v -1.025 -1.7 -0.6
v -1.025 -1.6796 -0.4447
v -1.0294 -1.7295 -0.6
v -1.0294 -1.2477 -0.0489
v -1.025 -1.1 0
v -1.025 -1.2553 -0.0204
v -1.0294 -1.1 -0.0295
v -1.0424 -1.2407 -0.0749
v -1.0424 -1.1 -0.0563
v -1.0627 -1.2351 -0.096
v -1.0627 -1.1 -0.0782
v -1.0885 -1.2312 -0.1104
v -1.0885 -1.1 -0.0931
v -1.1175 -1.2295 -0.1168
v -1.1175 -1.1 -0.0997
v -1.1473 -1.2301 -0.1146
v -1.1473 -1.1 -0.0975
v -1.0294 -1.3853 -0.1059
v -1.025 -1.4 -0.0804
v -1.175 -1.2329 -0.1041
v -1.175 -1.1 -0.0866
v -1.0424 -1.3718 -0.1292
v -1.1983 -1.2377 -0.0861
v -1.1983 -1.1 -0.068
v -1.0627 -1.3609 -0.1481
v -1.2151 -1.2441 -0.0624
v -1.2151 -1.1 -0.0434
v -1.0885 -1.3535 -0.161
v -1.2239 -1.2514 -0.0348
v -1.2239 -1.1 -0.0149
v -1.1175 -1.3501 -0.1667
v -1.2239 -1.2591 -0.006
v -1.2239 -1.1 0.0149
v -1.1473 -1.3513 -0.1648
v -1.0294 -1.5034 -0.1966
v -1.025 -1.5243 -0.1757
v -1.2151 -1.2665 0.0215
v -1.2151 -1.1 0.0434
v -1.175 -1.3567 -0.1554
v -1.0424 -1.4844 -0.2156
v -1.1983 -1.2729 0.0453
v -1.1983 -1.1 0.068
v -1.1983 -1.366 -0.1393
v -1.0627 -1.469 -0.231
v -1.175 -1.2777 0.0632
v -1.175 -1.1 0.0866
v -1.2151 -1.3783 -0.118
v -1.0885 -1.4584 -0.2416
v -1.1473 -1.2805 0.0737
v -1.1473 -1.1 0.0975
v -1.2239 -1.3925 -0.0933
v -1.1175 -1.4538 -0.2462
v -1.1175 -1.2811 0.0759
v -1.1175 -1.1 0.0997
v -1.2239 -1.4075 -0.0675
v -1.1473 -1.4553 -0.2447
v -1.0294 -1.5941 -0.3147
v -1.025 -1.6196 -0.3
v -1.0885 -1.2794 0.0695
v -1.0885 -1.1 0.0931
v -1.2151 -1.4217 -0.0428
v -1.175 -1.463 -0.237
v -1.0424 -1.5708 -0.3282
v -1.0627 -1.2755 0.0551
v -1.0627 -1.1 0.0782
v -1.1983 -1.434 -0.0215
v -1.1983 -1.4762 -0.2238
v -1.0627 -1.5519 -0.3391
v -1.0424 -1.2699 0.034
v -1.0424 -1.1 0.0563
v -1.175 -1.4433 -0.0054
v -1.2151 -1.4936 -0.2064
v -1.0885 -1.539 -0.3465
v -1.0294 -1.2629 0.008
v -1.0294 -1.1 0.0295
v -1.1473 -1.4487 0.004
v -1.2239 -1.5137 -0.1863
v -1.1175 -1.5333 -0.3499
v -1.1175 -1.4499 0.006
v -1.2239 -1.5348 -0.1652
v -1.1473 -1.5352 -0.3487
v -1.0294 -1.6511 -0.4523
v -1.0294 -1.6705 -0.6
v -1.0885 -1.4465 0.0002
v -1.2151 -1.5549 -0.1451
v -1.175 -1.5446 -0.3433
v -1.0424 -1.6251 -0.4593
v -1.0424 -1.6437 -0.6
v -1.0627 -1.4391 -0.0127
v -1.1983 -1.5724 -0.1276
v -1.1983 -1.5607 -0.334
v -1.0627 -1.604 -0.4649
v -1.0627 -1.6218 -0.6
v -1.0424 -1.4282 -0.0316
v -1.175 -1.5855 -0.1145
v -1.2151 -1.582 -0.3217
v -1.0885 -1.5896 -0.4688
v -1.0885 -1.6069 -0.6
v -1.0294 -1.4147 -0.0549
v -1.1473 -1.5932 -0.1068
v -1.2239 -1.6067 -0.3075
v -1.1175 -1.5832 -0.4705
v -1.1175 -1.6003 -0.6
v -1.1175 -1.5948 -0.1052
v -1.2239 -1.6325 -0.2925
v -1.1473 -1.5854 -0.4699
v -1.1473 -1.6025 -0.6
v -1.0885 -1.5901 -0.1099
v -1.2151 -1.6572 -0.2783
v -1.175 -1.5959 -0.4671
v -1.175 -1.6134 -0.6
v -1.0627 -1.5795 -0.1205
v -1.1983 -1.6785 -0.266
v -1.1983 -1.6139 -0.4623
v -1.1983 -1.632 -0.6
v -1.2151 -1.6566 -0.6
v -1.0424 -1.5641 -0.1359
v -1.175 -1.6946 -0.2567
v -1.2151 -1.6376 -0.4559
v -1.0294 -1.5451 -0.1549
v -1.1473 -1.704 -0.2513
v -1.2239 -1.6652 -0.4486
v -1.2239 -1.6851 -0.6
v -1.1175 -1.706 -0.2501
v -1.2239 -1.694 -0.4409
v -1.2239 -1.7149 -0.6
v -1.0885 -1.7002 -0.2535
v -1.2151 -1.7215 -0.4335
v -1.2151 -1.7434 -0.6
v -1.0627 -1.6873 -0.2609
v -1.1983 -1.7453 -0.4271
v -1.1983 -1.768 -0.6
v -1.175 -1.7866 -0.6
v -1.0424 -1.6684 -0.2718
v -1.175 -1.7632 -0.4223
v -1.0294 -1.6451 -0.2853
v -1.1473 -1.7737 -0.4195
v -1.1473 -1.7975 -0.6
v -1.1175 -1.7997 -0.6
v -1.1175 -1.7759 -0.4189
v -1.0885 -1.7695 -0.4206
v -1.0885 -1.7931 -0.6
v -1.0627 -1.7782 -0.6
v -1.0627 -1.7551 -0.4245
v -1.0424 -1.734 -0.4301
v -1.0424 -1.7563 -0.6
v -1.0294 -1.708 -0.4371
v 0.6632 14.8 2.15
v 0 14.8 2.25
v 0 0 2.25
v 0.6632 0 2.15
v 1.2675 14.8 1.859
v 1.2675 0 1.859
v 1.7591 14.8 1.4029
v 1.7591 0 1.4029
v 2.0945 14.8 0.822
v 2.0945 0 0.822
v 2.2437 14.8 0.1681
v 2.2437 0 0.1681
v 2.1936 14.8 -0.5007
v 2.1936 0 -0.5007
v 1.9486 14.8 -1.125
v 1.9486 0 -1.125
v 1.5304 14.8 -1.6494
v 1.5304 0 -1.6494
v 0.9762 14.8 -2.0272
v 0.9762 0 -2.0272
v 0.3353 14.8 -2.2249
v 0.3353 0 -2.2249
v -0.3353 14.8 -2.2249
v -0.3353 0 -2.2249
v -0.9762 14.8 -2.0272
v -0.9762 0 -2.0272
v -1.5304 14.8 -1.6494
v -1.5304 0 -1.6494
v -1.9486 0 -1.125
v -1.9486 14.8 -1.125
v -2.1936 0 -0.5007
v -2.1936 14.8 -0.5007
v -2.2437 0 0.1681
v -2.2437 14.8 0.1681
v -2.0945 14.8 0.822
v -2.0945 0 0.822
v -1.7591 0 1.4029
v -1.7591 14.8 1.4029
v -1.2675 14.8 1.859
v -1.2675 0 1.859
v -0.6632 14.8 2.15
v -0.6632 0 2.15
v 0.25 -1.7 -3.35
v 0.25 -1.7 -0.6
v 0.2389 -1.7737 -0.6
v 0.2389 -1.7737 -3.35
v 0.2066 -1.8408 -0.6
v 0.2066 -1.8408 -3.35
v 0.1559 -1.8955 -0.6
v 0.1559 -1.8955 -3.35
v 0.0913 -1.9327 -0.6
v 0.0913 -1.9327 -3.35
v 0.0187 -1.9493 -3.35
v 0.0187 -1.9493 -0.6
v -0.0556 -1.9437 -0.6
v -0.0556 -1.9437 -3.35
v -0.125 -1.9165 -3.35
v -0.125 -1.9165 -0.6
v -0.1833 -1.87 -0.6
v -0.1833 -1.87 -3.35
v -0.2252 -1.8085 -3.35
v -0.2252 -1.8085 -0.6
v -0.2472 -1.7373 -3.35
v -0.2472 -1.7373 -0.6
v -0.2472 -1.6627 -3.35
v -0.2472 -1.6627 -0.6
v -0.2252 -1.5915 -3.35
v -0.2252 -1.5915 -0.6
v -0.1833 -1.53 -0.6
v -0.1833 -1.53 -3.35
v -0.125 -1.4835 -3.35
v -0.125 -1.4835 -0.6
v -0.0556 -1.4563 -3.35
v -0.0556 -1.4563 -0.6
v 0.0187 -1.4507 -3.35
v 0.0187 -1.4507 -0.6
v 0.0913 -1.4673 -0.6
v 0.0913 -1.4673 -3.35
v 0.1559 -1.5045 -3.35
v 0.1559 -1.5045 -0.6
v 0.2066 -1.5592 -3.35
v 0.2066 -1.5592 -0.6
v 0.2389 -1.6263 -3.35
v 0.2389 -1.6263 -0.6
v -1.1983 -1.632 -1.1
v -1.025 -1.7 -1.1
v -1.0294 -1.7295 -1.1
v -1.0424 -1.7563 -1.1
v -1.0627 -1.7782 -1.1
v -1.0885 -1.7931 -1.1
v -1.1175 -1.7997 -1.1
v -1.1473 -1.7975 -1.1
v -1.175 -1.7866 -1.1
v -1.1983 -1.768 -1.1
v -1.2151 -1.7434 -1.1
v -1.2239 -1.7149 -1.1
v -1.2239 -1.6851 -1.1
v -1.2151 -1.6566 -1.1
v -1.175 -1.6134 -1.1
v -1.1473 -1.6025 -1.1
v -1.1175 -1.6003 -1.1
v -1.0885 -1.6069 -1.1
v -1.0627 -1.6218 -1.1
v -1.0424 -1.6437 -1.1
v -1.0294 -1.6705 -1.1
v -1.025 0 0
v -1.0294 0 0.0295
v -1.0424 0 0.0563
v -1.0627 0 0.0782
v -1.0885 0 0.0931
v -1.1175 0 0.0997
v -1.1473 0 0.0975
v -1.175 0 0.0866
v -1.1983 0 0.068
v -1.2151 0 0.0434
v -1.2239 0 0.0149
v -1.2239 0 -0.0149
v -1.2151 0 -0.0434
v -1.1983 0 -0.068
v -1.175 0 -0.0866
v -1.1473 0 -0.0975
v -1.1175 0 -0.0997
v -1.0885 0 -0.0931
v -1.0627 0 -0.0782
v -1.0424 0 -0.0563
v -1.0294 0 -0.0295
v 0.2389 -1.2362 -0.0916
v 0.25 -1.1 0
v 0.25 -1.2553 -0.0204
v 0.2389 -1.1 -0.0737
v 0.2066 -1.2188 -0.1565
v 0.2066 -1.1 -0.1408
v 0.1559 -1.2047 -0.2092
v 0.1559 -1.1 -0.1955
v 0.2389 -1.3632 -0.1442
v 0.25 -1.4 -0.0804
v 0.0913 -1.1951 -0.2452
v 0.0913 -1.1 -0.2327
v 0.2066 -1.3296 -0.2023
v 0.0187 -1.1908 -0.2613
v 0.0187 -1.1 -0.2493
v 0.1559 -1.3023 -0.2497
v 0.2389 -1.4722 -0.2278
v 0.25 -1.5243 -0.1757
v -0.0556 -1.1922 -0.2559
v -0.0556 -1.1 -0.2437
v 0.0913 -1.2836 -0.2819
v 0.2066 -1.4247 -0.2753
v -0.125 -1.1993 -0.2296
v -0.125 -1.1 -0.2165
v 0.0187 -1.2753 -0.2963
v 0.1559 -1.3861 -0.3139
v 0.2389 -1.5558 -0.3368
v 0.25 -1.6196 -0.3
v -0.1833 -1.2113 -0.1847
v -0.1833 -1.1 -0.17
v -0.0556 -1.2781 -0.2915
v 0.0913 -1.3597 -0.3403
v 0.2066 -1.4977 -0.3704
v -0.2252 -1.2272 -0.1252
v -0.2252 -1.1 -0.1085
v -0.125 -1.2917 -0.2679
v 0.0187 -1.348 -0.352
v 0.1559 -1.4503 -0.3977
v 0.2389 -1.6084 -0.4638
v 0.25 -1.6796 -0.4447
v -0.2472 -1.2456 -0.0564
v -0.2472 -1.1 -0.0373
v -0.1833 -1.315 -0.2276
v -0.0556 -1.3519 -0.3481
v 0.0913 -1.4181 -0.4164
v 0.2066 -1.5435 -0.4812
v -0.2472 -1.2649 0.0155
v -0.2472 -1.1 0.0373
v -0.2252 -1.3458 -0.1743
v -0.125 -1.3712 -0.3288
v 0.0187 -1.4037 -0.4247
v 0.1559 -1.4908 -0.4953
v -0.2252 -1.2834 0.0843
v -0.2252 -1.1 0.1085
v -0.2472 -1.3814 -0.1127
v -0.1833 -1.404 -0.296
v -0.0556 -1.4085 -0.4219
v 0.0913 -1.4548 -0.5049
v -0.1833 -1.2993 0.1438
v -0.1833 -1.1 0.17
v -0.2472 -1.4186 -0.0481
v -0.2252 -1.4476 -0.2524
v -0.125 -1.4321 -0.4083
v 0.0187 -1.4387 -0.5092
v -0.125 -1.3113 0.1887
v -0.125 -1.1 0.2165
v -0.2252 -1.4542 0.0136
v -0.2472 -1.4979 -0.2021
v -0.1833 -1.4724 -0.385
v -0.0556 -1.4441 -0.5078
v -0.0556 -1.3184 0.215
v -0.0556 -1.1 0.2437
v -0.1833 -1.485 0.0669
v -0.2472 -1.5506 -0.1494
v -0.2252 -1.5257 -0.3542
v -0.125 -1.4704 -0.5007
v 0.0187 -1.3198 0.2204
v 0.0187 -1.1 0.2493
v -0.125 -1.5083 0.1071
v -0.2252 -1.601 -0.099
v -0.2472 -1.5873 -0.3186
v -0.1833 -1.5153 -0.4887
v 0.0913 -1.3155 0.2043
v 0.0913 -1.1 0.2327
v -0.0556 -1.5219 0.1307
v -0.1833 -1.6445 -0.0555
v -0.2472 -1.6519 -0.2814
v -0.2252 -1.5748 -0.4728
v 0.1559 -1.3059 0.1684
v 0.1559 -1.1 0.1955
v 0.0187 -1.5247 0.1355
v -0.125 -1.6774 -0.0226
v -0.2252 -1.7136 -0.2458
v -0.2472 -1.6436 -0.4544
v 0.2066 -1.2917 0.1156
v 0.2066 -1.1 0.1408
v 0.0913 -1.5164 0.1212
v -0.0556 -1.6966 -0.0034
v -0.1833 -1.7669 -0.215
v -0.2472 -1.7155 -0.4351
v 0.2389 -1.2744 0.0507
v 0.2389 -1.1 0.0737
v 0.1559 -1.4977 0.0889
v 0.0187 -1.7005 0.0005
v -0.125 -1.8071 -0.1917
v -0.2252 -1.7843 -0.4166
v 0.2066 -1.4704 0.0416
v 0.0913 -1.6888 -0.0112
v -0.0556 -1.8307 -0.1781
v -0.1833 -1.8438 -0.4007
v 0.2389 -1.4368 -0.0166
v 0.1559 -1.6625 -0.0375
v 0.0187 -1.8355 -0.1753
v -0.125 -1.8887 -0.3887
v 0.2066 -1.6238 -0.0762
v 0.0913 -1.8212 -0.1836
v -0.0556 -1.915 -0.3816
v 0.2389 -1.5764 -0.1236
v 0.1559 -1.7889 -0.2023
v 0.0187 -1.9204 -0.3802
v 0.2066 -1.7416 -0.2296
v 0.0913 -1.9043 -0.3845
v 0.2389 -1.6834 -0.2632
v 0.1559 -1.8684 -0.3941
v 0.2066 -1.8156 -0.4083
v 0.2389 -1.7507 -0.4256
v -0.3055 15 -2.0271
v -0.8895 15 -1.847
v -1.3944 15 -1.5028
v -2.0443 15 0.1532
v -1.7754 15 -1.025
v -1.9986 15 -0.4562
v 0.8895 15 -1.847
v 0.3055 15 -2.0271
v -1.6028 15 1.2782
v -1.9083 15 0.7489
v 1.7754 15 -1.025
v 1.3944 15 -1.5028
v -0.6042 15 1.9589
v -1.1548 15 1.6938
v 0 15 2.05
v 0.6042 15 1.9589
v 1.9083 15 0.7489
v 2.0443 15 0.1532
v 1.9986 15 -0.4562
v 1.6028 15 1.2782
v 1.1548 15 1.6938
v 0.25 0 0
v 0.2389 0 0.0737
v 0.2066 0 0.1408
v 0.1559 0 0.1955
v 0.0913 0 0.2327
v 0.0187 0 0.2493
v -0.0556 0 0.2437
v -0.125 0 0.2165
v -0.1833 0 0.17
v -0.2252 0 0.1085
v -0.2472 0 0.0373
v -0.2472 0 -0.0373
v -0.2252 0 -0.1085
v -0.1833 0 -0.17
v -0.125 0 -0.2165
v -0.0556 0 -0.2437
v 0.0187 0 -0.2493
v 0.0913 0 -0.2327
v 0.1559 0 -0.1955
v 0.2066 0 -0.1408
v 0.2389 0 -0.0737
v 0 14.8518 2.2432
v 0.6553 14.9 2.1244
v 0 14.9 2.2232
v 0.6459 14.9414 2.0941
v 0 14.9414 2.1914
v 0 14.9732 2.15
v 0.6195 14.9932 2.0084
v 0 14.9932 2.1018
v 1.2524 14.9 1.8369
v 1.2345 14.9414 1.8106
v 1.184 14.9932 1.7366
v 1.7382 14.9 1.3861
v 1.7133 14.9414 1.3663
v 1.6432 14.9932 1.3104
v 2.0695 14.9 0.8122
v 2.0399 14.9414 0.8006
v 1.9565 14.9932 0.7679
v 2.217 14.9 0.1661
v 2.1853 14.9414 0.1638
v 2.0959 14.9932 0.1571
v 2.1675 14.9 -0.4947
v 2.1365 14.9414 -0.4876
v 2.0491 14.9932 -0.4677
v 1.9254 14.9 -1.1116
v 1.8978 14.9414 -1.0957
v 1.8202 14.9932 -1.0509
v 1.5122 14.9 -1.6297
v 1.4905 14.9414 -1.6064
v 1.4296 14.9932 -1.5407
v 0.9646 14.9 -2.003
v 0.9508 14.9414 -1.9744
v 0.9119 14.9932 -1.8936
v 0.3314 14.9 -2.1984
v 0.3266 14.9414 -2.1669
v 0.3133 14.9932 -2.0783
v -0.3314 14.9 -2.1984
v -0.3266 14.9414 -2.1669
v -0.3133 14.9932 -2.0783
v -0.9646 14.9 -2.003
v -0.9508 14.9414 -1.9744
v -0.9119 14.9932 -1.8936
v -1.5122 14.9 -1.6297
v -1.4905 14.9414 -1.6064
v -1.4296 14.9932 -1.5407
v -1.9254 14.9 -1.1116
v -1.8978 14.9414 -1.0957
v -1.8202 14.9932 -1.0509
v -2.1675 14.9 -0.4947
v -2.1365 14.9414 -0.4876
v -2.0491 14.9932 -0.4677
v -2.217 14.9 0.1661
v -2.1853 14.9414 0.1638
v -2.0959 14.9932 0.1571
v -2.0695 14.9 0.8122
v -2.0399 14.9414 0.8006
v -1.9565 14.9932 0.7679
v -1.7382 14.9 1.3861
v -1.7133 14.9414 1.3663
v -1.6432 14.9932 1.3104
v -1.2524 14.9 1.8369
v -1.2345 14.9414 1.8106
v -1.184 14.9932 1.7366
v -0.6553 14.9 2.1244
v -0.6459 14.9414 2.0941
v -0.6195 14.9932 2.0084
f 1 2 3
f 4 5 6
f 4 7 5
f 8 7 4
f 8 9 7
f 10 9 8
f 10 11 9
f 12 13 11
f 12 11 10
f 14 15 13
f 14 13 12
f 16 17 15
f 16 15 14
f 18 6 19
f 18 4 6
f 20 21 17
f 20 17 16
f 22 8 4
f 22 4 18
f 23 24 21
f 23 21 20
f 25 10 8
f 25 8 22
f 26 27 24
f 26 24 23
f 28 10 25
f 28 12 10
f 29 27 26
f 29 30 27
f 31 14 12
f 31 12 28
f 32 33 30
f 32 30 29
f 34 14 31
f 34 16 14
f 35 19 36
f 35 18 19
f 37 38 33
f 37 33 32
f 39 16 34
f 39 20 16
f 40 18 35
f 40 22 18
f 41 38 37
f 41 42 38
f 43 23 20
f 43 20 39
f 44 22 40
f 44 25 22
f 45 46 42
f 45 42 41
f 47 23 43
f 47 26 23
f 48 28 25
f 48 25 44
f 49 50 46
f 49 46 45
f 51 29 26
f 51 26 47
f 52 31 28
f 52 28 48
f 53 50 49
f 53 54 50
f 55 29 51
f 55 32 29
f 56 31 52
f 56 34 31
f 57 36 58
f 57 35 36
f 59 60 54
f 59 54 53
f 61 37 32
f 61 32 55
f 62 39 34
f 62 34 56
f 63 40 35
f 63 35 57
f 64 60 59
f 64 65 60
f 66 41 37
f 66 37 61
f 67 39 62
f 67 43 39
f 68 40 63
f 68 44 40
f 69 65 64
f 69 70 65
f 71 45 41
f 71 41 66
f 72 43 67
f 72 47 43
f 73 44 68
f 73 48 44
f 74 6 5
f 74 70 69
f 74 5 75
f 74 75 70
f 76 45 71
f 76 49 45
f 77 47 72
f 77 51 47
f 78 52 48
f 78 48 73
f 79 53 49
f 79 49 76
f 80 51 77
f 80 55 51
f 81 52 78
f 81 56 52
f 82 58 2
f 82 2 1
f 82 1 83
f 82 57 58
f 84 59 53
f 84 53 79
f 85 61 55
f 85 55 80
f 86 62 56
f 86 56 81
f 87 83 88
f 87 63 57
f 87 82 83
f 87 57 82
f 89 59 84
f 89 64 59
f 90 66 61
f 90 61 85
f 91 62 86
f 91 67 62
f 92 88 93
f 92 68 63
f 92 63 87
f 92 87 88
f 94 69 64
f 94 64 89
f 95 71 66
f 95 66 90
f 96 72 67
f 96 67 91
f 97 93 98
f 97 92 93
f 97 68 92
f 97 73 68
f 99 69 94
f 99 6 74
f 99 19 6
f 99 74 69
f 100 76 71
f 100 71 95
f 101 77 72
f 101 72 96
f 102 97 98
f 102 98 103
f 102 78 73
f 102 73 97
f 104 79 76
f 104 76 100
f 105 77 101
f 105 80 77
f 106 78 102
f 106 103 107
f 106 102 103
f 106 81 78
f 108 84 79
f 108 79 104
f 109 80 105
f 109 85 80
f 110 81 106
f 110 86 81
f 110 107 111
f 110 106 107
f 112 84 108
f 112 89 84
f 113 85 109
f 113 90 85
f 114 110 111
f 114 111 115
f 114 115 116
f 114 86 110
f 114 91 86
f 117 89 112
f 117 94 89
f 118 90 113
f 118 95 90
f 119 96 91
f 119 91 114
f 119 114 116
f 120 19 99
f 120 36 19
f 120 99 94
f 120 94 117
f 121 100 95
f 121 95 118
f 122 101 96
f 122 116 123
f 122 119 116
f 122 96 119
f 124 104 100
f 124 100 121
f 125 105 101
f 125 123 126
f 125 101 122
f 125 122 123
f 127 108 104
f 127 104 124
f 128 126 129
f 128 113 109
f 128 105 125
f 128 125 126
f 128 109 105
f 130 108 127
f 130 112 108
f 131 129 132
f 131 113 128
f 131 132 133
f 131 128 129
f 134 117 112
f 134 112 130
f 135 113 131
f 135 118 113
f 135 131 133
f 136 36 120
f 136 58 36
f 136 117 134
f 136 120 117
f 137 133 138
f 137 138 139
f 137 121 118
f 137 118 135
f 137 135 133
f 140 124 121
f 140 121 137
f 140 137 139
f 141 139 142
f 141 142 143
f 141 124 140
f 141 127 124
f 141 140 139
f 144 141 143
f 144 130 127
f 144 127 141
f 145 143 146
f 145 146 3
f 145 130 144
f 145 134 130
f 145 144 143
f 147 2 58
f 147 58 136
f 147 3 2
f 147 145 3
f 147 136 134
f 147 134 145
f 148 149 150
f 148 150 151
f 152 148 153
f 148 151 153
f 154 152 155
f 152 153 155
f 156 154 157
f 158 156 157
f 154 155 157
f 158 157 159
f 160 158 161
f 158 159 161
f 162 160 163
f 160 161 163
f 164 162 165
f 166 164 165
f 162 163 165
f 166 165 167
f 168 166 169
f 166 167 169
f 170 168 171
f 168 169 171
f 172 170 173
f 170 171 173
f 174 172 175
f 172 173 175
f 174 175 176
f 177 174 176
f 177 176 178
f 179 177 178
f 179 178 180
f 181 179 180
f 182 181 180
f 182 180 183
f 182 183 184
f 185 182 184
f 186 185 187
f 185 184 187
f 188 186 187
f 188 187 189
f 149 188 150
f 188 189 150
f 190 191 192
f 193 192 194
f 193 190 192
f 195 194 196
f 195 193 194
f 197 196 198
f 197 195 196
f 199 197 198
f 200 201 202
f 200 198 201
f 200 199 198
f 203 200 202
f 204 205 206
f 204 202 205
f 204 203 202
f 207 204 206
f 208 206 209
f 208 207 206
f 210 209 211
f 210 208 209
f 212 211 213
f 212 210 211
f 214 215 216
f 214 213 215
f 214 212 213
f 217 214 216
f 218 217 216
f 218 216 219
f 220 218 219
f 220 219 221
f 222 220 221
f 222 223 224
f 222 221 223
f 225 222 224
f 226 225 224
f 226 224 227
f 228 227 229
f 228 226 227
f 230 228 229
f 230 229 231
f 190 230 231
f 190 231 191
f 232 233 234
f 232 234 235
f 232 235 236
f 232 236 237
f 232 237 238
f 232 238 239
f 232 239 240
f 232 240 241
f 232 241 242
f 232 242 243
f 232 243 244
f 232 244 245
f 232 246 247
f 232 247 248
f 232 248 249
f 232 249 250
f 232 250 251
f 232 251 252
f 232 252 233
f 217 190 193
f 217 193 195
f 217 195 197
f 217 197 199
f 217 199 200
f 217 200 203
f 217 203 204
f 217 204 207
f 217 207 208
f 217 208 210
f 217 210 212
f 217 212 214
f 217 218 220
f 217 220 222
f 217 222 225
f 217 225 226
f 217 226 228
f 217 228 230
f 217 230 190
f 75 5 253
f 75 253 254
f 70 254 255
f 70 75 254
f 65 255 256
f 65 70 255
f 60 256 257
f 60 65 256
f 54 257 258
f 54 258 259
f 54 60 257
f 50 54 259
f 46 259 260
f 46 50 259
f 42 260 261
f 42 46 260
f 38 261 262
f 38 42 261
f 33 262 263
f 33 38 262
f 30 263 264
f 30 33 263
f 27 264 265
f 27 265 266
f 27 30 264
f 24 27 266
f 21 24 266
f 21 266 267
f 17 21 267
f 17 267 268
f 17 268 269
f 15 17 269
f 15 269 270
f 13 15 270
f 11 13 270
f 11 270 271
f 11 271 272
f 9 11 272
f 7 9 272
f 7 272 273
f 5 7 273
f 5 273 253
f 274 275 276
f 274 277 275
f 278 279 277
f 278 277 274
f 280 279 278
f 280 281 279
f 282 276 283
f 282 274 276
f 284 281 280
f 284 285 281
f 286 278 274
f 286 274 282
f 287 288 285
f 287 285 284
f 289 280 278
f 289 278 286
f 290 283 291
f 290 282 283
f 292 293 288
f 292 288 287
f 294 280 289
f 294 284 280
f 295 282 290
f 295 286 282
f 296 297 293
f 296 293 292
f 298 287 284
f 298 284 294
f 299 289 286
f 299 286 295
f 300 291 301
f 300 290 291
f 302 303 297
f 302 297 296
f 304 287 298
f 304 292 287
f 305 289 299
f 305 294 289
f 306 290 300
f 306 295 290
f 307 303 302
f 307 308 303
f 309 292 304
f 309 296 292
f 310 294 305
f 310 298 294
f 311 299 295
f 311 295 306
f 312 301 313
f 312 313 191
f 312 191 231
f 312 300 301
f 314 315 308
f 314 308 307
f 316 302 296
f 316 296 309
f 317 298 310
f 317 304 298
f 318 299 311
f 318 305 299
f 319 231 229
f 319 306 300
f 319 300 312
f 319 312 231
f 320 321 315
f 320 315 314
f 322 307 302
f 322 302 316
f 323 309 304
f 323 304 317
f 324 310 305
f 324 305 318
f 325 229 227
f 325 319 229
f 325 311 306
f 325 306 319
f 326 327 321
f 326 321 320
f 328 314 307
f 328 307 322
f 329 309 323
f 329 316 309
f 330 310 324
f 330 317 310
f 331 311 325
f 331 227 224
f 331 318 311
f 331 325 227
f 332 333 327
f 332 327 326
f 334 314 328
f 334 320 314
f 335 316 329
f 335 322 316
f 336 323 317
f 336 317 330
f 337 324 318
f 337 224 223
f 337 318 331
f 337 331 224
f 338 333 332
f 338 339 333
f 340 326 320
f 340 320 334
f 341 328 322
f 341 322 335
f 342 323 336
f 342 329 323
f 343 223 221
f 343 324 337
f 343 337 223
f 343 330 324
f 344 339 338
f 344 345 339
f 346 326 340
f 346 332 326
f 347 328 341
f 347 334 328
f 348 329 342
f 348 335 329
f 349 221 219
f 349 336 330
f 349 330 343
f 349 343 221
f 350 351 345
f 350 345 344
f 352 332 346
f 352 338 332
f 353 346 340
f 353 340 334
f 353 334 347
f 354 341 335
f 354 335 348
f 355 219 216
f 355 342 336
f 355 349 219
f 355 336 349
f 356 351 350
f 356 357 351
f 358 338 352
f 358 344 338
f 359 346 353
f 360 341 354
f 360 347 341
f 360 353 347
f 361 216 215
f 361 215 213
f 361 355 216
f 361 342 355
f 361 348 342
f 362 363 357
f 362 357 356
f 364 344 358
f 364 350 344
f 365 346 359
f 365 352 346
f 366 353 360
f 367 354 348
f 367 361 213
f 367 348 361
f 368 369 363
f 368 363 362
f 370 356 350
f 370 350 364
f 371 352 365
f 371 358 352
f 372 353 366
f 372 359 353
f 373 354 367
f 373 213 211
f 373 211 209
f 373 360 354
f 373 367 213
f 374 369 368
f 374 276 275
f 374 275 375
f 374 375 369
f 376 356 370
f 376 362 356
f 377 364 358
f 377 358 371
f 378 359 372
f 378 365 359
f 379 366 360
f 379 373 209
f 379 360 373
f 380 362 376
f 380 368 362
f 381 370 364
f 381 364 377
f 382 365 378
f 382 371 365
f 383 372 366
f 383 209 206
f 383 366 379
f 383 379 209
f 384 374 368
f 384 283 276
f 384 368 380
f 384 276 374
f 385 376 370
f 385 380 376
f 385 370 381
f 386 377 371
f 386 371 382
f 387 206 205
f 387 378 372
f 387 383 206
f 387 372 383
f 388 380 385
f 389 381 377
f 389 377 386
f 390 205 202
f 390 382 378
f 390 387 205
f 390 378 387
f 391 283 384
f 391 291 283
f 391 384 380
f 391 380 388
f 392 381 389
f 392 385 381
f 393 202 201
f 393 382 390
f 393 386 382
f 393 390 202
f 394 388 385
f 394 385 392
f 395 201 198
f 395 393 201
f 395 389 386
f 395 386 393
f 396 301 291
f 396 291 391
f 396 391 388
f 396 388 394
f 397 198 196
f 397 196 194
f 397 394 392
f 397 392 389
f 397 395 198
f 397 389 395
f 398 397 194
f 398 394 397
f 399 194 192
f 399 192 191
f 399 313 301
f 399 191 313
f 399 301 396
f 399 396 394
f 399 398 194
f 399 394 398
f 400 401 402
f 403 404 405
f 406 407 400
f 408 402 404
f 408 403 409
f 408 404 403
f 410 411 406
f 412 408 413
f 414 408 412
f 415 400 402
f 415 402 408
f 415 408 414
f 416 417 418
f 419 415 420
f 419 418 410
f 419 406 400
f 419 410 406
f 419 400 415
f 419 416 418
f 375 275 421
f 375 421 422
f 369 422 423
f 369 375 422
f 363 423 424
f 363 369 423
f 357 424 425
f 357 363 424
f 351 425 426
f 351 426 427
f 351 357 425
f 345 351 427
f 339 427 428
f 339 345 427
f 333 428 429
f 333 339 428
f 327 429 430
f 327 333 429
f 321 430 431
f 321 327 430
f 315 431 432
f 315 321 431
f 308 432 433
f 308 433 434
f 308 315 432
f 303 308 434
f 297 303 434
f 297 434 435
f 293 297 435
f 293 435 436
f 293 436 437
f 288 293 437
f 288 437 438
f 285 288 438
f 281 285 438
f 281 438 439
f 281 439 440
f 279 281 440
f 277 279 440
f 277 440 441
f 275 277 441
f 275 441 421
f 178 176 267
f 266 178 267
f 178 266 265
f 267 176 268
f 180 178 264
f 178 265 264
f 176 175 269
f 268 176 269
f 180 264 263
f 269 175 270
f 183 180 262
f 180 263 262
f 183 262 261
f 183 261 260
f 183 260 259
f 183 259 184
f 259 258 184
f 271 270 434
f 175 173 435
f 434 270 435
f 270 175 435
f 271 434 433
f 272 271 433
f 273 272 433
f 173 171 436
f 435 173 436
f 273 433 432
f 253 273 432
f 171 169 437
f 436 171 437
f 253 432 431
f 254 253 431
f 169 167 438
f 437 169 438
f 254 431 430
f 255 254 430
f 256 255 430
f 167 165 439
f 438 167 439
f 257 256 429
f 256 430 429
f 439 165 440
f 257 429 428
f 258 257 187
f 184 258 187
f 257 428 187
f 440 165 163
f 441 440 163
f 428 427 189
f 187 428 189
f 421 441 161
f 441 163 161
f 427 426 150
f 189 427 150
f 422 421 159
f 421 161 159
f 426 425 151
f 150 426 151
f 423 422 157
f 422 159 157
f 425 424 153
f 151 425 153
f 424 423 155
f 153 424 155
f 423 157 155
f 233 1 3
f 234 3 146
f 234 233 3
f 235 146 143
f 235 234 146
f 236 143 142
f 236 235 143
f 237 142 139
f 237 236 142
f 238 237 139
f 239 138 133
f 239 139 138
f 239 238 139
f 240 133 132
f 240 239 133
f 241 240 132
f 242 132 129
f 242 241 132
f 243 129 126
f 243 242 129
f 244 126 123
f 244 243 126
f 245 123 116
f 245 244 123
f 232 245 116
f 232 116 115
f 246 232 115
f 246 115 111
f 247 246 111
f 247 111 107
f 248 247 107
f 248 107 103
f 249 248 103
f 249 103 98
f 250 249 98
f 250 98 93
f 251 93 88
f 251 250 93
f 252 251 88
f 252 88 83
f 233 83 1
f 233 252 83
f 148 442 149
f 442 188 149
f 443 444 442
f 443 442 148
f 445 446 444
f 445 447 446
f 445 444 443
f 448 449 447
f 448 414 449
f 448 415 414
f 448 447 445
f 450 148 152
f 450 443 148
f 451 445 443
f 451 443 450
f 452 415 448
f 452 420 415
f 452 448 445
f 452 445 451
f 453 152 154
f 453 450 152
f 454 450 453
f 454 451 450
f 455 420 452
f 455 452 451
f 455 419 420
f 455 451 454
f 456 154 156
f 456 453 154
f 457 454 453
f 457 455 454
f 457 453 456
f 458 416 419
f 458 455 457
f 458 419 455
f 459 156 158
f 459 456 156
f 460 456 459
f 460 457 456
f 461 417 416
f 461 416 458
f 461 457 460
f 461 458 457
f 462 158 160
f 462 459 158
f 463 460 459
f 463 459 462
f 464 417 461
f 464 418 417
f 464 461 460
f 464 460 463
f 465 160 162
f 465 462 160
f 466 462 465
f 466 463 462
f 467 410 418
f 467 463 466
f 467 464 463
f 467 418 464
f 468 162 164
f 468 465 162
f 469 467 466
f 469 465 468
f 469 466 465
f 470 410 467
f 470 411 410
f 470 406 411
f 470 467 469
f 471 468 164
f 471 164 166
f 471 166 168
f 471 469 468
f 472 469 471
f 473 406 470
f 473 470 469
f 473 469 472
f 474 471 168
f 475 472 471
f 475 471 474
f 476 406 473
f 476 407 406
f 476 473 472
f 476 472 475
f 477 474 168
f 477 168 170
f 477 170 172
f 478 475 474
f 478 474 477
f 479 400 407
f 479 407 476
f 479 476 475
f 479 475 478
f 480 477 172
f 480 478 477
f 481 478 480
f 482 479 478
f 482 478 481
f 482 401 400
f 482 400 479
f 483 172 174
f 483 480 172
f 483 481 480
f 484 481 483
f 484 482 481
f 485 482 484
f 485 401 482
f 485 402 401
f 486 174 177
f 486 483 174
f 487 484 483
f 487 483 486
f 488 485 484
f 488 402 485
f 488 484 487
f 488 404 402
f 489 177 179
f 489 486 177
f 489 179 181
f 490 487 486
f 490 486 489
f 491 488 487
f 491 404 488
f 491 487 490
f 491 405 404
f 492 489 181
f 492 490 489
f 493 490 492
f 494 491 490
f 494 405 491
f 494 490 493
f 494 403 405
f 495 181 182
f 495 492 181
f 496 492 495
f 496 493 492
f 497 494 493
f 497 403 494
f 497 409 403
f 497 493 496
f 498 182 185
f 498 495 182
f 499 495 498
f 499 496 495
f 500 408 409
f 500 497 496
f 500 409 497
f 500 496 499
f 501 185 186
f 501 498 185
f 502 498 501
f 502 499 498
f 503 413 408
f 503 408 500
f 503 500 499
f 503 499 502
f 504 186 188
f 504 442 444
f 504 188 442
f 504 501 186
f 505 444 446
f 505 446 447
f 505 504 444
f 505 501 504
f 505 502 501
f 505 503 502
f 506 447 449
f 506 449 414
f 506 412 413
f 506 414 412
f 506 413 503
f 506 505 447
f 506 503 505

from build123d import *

# Parameters (mm, degrees)
SKETCH1_R           = 2.25
BOSS_EXTRUDE1_DEPTH = 15
SKETCH2_R           = 0.25
SKETCH4_R           = 0.1
FILLET1_R           = 0.2


with BuildPart() as part:
    # Sketch1 → Boss-Extrude1 (new body)
    with BuildSketch(Plane(origin=(0, 0, 0), x_dir=(1, 0, 0), z_dir=(0, 1, 0))):
        with Locations(Location((0, 0, 0), (0, 0, 270))):
            Circle(SKETCH1_R)
    extrude(amount=BOSS_EXTRUDE1_DEPTH)

    # Sweep1: sweep along a path in Sketch3
    with BuildLine(Plane(origin=(0, 0, 0), x_dir=(0, 0, -1), z_dir=(1, 0, 0))) as sweep1_path:
        Line((0, 0), (0, -1.1))
        ThreePointArc((0, -1.1), (0.175735931, -1.524264069), (0.6, -1.7))
        Line((0.6, -1.7), (3.35, -1.7))
    # Sketch2 → Sweep1 (sweep)
    with BuildSketch(Plane.XZ):
        Circle(SKETCH2_R)
    sweep(path=sweep1_path.line)

    # Sweep2: sweep along a path in Sketch5
    with BuildLine(Plane(origin=(0, 0, 0), x_dir=(0, 0, -1), z_dir=(1, 0, 0))) as sweep2_path:
        Line((0, 0), (0, -1.1))
        ThreePointArc((0, -1.1), (0.175735931, -1.524264069), (0.6, -1.7))
        Line((0.6, -1.7), (1.1, -1.7))
    # Sketch4 → Sweep2 (sweep)
    with BuildSketch(Plane.XZ):
        with Locations((-1.125, 0)):
            Circle(SKETCH4_R)
    sweep(path=sweep2_path.line)

    # Fillet1
    fillet1_edges = [part.edges().sort_by_distance(p)[0] for p in [
        (0, 15, -2.25),
    ]]
    fillet(fillet1_edges, radius=FILLET1_R)


solid = part.part
